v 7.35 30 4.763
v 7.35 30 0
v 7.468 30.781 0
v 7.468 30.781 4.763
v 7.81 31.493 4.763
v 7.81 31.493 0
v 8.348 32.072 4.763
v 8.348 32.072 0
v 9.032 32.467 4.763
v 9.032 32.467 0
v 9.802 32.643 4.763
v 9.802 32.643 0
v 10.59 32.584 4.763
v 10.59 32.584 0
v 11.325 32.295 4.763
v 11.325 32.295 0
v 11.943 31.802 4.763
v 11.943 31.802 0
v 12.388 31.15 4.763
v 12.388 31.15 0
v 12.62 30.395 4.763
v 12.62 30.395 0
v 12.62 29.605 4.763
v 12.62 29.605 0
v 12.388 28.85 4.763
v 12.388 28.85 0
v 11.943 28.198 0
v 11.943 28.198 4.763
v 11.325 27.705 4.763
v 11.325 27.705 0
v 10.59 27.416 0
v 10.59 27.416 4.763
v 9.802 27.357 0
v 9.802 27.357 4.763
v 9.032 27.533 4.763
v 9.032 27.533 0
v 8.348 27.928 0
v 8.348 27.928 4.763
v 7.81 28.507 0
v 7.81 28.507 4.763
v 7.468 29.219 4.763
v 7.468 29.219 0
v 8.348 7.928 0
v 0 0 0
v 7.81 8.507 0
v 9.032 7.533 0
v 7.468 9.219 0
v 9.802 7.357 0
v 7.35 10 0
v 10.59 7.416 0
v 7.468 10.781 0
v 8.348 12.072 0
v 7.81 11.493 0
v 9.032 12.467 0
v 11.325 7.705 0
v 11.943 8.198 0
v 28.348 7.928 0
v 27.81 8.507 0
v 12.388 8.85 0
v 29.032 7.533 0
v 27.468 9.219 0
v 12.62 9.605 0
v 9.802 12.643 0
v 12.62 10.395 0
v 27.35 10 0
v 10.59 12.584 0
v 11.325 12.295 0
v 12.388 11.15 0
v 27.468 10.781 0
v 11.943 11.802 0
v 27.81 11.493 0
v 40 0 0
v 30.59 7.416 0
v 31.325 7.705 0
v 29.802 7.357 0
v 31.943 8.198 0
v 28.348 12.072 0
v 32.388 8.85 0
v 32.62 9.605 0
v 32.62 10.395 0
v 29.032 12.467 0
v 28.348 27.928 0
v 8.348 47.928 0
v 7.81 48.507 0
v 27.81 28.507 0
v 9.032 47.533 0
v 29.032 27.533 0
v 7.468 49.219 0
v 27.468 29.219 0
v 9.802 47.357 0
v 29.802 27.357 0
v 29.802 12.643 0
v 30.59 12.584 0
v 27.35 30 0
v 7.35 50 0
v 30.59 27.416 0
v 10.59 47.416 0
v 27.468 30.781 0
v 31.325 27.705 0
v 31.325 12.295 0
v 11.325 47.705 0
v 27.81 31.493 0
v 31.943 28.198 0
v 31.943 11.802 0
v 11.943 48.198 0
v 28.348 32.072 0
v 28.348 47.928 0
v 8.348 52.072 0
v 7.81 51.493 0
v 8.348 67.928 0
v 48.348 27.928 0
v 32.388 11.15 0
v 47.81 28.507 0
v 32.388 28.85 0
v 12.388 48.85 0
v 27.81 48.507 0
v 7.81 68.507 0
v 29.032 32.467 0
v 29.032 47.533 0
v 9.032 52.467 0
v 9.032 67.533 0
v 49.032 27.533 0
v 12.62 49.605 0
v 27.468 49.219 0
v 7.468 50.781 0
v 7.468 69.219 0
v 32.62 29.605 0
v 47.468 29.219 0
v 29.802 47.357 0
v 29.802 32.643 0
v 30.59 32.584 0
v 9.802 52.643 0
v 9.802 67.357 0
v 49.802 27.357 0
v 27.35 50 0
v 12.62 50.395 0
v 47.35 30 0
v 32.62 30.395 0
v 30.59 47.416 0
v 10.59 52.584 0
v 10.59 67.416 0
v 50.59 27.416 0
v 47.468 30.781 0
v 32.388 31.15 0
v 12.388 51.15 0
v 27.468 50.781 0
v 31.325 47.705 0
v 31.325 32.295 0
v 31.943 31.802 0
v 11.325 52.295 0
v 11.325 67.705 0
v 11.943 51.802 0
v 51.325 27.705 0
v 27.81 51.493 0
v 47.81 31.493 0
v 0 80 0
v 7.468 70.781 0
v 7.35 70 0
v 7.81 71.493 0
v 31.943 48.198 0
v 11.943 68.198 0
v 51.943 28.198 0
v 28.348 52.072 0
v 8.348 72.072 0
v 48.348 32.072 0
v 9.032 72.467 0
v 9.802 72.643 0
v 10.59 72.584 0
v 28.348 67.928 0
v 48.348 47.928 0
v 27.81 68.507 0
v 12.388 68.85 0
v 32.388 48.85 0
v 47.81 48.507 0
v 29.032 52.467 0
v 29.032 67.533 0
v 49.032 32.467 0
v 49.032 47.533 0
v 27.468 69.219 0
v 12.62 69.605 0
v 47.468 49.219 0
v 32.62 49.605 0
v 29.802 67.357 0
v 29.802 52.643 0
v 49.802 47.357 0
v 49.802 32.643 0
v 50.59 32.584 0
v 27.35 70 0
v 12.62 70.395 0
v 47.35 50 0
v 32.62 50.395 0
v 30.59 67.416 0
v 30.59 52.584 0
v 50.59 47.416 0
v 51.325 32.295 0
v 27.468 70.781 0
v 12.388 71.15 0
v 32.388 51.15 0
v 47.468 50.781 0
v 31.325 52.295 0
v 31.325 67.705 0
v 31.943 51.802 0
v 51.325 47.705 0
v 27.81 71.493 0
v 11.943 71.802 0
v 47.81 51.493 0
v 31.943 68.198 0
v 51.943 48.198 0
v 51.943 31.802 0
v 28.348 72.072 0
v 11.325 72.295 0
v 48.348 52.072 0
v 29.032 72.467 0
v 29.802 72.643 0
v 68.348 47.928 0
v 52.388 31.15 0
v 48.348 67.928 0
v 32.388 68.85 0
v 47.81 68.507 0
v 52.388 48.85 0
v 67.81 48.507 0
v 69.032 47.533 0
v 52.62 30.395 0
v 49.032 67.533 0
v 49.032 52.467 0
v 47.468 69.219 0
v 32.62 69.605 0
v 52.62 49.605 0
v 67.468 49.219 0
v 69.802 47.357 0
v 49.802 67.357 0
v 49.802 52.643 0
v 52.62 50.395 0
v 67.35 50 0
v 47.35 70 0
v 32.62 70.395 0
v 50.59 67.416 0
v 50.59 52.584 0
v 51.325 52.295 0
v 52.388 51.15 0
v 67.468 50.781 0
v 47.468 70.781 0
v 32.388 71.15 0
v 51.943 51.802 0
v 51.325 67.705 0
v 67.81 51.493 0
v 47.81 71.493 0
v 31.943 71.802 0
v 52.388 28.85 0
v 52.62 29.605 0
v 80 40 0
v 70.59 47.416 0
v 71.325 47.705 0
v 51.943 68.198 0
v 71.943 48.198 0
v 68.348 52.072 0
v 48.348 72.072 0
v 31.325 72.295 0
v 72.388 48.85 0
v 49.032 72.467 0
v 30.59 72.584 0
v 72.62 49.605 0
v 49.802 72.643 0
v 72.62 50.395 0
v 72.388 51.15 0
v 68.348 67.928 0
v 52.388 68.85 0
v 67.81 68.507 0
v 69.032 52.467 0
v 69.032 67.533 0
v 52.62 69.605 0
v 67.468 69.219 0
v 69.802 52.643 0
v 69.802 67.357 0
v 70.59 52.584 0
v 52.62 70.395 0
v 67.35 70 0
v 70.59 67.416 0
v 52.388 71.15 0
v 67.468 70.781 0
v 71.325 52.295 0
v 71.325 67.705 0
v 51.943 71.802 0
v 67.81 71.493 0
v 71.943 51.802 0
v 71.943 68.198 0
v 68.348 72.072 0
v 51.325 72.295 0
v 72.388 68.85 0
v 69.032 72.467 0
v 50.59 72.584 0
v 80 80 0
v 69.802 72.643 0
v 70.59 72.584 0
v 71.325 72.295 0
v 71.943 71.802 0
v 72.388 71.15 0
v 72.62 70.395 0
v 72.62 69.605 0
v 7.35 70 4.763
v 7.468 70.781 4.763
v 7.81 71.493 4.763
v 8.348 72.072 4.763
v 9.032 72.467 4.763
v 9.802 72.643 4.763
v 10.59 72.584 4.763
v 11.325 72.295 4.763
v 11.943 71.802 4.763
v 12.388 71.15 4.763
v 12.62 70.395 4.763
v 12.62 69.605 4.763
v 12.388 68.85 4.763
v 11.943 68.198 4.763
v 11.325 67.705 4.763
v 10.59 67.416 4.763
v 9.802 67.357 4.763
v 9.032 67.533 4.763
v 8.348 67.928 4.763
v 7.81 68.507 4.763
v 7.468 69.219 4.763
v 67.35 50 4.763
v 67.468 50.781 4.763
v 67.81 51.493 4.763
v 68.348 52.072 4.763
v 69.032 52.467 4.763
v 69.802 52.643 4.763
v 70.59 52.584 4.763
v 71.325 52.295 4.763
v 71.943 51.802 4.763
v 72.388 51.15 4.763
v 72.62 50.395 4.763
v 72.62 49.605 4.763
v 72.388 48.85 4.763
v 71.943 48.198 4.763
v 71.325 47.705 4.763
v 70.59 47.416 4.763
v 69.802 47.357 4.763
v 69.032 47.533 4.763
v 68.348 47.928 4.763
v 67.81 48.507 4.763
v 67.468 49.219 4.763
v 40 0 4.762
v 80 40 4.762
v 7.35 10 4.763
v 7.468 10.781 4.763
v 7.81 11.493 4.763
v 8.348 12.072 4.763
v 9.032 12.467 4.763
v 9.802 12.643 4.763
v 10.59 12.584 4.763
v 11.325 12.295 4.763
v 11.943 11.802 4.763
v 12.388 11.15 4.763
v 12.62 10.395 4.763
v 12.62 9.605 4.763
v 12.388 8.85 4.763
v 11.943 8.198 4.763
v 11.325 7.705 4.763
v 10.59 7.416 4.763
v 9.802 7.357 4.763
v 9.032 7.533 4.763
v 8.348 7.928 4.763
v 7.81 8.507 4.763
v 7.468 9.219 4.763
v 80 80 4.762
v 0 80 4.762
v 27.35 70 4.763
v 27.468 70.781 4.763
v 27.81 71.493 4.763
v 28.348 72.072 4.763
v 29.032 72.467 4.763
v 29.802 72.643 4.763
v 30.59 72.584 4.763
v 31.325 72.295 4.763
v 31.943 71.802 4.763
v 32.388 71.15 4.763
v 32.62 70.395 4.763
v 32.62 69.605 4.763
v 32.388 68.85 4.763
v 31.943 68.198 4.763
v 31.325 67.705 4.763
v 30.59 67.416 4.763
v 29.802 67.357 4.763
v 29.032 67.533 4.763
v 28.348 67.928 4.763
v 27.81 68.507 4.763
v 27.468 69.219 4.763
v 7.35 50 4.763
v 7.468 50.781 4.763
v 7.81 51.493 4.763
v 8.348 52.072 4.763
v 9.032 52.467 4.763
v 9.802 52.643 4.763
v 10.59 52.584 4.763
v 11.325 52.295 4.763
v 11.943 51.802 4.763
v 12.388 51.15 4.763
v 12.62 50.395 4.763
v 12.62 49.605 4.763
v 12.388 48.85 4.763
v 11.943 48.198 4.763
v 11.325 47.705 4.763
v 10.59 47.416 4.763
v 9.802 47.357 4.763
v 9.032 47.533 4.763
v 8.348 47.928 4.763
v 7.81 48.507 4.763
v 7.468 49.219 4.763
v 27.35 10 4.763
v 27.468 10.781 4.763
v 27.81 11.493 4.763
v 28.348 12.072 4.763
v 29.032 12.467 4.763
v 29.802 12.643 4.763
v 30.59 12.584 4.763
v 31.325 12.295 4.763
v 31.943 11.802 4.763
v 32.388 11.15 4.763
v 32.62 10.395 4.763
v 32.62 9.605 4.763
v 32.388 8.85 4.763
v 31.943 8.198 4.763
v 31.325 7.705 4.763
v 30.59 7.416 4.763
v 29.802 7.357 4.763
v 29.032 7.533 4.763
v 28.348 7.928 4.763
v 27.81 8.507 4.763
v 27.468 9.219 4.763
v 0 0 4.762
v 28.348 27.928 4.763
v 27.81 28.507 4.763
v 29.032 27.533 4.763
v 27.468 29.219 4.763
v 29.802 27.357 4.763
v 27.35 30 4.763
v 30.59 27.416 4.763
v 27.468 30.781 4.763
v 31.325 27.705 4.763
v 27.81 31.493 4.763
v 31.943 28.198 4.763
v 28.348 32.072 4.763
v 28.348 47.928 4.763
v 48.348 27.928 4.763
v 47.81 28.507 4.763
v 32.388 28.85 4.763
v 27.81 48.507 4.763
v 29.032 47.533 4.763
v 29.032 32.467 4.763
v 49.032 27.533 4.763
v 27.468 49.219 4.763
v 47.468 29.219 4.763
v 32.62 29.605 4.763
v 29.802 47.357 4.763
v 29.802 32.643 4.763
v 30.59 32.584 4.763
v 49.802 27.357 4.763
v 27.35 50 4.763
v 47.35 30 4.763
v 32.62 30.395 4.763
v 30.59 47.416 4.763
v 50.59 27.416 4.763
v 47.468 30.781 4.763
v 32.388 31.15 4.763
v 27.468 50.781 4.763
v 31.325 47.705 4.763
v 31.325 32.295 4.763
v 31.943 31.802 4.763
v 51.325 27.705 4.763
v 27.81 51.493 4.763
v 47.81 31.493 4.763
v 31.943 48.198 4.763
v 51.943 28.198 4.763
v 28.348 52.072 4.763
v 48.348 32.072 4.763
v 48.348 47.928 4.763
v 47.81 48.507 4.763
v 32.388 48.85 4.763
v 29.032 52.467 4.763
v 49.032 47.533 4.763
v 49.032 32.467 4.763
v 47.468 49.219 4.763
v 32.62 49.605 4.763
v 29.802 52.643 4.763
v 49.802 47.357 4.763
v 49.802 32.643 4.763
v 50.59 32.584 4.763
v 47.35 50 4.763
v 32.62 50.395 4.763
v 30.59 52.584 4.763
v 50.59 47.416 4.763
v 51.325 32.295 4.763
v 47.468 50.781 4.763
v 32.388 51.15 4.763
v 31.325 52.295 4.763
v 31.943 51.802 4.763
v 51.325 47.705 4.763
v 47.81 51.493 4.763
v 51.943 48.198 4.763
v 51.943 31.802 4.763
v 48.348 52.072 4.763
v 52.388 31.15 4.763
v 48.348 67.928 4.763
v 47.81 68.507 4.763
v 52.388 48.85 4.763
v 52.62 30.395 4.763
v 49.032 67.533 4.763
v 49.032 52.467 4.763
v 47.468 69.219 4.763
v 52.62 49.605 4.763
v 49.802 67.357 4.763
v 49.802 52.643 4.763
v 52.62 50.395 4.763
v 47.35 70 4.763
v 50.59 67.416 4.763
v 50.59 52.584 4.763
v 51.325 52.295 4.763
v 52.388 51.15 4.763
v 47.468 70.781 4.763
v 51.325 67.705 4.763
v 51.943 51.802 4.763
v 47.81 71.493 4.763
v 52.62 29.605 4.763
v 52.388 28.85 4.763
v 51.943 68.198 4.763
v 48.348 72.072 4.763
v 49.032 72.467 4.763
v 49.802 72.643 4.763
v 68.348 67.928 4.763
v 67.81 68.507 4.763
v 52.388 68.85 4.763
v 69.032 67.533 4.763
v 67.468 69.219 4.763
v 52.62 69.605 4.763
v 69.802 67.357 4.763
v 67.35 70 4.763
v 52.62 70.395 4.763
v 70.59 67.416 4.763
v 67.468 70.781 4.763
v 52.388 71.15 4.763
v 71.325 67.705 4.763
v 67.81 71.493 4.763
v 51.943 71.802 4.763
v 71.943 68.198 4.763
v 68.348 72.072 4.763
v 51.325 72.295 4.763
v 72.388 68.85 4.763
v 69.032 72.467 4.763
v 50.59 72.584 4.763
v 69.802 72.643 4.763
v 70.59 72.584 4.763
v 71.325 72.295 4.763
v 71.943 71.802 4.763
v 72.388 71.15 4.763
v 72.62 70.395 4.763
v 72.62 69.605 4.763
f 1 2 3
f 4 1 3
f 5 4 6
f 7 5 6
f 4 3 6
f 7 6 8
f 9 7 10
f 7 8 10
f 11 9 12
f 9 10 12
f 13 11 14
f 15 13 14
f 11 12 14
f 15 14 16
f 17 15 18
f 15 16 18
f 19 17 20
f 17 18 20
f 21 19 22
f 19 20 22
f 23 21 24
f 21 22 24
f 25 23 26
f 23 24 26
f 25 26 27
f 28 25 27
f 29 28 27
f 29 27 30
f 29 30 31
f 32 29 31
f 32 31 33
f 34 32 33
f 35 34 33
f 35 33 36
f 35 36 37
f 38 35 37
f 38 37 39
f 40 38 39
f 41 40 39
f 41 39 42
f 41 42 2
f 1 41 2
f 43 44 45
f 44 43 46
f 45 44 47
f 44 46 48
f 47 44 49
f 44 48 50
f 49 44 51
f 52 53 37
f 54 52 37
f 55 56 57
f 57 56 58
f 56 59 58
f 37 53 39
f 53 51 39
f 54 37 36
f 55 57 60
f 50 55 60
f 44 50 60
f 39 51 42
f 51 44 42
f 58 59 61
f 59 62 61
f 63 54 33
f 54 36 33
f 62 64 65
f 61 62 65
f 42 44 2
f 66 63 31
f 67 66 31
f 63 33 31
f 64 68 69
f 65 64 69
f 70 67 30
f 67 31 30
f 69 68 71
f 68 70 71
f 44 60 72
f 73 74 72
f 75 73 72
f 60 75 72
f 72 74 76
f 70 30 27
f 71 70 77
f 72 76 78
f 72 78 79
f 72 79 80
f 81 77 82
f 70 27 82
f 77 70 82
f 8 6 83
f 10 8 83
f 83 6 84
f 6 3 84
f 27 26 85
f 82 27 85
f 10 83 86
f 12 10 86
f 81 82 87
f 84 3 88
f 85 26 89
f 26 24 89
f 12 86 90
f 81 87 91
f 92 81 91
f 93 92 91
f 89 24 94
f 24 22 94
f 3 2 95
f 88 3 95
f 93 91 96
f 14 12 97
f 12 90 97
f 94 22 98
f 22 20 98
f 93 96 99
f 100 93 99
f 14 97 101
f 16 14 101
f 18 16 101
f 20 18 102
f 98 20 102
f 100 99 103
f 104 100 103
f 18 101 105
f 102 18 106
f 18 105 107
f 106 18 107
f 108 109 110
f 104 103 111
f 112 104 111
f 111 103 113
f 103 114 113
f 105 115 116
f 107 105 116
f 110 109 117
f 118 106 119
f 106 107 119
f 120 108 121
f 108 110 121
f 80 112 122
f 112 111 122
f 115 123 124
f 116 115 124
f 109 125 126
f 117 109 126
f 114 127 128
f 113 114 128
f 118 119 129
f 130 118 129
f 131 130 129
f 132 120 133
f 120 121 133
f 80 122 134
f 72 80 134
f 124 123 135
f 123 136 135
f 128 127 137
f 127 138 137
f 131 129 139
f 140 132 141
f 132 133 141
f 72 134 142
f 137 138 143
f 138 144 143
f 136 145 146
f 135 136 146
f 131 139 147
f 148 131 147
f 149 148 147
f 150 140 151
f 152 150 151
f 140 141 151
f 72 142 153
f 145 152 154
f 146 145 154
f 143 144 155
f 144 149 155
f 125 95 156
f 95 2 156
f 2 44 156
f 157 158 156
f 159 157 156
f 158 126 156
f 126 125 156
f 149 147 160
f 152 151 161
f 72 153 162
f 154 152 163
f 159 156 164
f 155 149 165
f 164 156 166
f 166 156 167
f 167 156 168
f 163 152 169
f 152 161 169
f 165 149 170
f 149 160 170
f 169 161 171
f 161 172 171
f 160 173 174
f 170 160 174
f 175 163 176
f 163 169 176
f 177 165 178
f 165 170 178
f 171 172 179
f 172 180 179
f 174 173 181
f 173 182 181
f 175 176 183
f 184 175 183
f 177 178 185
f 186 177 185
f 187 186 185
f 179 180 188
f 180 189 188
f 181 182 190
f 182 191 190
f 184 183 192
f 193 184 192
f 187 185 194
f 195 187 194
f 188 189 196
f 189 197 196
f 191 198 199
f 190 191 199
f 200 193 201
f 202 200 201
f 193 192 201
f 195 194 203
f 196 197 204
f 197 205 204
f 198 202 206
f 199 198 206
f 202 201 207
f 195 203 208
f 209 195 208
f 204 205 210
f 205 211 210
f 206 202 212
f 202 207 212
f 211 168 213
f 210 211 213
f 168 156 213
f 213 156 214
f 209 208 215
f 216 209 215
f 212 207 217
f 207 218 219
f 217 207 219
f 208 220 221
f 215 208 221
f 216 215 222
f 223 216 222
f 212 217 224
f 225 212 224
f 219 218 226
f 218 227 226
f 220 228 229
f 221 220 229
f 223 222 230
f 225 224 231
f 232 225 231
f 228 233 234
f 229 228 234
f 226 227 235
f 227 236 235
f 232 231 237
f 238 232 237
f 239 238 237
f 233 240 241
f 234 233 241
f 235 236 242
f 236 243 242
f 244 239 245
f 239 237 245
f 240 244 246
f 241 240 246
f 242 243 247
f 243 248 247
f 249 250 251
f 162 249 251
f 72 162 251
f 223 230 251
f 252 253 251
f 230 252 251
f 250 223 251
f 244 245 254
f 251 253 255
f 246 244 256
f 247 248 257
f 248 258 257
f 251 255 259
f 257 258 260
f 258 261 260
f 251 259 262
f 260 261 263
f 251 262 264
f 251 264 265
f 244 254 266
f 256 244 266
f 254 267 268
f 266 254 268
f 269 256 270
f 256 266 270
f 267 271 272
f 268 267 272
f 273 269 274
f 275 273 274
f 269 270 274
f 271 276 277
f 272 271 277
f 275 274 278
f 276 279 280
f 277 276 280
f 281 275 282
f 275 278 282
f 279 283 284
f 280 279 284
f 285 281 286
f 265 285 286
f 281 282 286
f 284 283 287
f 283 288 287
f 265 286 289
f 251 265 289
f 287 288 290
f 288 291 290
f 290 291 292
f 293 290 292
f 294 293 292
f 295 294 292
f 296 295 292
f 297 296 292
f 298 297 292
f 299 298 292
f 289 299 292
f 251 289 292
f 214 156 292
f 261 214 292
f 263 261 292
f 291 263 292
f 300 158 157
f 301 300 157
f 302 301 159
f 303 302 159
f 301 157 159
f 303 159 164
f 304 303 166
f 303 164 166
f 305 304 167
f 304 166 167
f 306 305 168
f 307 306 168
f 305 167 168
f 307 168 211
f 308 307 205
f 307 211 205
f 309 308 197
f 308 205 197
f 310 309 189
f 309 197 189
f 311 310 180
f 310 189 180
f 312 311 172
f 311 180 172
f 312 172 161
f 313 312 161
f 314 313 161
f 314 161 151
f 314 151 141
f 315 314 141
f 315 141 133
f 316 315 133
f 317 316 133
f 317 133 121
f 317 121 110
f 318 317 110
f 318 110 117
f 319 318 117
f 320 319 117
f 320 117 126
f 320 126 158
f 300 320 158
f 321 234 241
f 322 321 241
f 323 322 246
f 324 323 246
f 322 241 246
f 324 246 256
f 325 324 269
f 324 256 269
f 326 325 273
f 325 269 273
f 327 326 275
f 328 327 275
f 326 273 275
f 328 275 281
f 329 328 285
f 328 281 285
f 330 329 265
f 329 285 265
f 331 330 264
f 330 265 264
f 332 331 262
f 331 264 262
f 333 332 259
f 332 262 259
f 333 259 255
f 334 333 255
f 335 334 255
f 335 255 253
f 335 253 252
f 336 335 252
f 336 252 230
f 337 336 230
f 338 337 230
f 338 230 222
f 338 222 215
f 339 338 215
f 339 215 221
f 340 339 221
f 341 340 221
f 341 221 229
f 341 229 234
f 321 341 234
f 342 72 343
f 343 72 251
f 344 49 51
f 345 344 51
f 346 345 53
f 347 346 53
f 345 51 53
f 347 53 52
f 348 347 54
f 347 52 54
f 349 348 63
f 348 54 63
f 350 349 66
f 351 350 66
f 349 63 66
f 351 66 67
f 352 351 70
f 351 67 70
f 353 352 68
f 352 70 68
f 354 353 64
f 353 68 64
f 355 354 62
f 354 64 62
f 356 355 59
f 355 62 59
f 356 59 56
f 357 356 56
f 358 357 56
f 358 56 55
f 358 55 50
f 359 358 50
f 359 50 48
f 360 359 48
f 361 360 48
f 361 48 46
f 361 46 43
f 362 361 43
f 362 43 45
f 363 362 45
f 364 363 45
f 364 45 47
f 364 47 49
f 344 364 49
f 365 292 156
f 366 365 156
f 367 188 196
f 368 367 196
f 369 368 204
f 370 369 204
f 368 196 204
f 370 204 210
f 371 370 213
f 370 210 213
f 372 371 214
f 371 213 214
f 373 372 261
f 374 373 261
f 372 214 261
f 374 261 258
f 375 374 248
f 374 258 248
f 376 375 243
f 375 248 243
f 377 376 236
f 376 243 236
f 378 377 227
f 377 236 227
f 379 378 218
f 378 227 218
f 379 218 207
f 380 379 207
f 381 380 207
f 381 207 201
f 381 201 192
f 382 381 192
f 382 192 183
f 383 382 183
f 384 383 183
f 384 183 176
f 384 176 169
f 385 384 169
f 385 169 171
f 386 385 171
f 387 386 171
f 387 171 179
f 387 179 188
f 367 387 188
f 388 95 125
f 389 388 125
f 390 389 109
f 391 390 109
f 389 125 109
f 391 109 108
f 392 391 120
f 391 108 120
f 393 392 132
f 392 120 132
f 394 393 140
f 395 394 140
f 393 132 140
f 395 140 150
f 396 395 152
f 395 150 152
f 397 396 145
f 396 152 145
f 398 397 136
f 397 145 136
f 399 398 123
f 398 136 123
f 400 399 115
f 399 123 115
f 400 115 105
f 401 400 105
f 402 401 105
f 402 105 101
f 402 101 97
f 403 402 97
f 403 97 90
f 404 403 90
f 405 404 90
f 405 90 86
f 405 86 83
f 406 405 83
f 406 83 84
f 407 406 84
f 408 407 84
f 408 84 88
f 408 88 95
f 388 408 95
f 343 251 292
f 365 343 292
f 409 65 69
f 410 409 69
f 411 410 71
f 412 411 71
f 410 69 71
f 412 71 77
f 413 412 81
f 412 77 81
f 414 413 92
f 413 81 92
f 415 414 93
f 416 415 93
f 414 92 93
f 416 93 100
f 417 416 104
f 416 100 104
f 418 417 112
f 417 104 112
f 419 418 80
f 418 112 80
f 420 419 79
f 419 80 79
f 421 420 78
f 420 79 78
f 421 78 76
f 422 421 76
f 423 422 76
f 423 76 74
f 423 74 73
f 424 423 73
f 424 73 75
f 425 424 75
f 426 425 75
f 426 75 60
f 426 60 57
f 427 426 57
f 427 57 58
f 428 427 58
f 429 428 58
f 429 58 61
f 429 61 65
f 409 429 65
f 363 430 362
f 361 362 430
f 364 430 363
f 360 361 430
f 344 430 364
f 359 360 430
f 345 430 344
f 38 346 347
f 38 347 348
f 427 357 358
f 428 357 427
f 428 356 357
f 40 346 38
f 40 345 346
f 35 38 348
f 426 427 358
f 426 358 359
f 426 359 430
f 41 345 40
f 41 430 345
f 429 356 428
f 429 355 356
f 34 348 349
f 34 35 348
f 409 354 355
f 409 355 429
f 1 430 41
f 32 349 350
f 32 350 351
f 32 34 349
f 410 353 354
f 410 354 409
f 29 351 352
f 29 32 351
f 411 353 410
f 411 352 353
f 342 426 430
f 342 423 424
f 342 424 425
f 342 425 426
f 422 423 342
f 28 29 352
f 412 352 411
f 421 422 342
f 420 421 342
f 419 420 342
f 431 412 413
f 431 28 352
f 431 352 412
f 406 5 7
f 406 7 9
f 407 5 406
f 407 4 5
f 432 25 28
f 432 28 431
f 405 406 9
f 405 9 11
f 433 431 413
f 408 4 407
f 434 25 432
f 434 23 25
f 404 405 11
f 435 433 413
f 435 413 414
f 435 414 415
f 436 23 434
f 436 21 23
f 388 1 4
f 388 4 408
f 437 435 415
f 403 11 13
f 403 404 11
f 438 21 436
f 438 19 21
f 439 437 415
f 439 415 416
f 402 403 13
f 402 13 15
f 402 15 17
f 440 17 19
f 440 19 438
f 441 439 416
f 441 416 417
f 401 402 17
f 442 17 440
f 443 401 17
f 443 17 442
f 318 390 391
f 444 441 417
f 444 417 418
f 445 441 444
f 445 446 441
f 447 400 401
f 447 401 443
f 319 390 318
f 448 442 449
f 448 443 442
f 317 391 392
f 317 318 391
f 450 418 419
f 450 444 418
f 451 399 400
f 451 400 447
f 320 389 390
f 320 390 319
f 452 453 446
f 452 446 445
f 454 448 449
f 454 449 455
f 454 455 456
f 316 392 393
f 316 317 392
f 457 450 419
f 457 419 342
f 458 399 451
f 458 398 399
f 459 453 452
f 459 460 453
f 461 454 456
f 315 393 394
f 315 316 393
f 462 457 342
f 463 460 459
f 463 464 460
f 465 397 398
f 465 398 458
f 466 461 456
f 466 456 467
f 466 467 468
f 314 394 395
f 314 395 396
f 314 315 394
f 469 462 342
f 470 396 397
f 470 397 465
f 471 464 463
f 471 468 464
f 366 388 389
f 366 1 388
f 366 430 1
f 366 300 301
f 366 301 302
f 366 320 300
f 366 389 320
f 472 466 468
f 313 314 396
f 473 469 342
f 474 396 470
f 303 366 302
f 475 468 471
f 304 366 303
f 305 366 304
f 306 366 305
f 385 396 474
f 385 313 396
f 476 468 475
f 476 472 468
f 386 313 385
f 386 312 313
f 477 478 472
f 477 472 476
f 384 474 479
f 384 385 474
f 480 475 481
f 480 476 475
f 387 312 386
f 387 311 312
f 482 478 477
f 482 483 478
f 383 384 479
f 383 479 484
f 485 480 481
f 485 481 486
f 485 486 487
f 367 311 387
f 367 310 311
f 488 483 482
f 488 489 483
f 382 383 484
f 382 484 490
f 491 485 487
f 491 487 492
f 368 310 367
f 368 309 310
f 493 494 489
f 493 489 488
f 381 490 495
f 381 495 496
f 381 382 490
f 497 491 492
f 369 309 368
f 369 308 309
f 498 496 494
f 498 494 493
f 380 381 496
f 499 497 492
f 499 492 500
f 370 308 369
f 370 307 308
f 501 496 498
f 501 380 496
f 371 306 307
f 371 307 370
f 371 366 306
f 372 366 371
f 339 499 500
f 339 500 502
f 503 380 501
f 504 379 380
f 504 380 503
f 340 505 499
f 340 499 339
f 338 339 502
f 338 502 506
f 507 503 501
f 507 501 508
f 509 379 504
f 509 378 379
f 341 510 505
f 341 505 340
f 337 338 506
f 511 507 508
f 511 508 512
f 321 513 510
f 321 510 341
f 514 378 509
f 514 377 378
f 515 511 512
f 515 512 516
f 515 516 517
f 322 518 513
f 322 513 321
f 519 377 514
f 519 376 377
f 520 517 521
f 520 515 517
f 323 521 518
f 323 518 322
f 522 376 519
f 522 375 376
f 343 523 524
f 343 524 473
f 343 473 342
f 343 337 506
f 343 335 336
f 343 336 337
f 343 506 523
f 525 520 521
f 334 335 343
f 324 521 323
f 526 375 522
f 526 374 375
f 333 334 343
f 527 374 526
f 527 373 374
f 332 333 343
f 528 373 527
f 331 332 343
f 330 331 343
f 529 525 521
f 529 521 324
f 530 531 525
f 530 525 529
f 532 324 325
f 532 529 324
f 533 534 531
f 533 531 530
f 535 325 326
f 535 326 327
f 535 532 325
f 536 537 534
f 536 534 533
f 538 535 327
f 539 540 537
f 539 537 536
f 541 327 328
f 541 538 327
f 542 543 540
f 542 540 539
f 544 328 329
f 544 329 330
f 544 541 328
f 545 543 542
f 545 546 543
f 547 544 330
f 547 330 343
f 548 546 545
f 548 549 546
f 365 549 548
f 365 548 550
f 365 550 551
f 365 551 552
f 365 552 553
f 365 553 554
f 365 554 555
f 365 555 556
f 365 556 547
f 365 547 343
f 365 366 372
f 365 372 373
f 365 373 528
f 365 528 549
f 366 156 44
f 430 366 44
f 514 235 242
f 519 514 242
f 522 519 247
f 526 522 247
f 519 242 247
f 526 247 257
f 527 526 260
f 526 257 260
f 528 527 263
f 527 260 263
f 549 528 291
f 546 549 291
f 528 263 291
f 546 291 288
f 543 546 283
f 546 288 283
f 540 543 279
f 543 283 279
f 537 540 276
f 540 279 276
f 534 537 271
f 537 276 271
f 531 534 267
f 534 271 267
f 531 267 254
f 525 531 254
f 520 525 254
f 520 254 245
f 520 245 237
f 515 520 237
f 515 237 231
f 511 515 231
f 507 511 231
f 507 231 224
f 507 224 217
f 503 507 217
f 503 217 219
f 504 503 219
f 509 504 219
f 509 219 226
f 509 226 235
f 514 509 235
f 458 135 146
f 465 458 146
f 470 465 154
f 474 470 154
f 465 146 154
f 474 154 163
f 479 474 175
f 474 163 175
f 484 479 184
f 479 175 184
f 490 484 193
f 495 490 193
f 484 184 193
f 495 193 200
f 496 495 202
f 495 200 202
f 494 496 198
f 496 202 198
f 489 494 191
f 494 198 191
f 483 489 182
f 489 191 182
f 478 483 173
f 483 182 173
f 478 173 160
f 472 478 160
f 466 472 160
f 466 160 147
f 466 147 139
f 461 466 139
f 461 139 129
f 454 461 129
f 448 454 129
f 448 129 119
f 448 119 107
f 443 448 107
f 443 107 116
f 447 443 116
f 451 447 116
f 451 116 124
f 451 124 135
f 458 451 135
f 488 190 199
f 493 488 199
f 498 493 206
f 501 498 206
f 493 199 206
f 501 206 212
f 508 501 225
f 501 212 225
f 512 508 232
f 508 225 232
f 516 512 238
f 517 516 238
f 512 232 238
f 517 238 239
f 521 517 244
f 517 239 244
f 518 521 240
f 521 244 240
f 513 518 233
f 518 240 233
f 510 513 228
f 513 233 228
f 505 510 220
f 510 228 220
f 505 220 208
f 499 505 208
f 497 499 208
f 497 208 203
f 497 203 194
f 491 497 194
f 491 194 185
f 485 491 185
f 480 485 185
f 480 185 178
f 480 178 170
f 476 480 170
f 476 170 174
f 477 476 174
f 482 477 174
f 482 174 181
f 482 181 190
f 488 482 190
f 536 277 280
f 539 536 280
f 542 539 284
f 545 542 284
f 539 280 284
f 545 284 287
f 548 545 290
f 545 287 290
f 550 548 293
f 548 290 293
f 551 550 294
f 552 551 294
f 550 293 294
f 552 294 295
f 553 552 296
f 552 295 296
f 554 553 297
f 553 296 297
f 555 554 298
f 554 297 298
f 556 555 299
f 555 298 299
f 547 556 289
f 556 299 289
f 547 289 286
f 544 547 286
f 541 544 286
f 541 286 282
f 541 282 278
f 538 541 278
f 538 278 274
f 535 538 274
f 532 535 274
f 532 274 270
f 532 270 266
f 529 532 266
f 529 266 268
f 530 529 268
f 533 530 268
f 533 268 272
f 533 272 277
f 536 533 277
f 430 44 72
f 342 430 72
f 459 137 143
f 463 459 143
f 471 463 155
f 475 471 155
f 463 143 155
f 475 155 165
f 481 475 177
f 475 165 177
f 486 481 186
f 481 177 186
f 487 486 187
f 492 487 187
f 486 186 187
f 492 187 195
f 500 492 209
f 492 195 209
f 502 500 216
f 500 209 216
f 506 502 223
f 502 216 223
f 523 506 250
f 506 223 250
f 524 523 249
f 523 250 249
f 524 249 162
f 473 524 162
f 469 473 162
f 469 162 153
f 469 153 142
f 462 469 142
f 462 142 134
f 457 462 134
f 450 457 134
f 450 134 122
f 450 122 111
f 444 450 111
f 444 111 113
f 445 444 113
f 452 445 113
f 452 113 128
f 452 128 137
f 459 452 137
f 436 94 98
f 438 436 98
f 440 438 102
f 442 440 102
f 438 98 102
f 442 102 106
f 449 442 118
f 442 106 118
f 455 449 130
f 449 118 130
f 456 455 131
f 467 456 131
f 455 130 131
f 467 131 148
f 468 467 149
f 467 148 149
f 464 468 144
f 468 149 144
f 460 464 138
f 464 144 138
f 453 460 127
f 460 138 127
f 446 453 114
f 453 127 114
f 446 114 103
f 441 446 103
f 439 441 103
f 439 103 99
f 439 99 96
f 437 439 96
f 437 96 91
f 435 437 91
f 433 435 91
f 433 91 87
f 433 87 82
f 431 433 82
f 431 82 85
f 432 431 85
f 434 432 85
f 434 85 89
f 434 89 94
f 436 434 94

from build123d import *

# Parameters (mm, degrees)
SKETCH1_W            = 40
SKETCH1_H            = 40
BOSS_EXTRUDE1_DEPTH  = 4.7625
M5_CLEARANCE_HOLE1_D = 5.3


with BuildPart() as part:
    # Sketch1 → Boss-Extrude1 (new body)
    with BuildSketch(Plane.XY):
        with Locations((20, 20)):
            Rectangle(SKETCH1_W, SKETCH1_H)
        with Locations((20, 60)):
            Rectangle(SKETCH1_W, SKETCH1_H)
        with Locations((60, 60)):
            Rectangle(SKETCH1_W, SKETCH1_H)
        Polygon((40, 40), (40, 0), (80, 40), align=None)
    extrude(amount=BOSS_EXTRUDE1_DEPTH)

    # M5 Clearance Hole1 (through all)
    with Locations(Plane.XY.offset(4.7625)):
        with Locations((10, 70), (30, 70), (50, 70), (70, 70), (30, 50), (50, 50), (70, 50), (30, 30), (50, 30), (30, 10), (10, 50), (10, 30), (10, 10)):
            Hole(M5_CLEARANCE_HOLE1_D / 2)


solid = part.part
